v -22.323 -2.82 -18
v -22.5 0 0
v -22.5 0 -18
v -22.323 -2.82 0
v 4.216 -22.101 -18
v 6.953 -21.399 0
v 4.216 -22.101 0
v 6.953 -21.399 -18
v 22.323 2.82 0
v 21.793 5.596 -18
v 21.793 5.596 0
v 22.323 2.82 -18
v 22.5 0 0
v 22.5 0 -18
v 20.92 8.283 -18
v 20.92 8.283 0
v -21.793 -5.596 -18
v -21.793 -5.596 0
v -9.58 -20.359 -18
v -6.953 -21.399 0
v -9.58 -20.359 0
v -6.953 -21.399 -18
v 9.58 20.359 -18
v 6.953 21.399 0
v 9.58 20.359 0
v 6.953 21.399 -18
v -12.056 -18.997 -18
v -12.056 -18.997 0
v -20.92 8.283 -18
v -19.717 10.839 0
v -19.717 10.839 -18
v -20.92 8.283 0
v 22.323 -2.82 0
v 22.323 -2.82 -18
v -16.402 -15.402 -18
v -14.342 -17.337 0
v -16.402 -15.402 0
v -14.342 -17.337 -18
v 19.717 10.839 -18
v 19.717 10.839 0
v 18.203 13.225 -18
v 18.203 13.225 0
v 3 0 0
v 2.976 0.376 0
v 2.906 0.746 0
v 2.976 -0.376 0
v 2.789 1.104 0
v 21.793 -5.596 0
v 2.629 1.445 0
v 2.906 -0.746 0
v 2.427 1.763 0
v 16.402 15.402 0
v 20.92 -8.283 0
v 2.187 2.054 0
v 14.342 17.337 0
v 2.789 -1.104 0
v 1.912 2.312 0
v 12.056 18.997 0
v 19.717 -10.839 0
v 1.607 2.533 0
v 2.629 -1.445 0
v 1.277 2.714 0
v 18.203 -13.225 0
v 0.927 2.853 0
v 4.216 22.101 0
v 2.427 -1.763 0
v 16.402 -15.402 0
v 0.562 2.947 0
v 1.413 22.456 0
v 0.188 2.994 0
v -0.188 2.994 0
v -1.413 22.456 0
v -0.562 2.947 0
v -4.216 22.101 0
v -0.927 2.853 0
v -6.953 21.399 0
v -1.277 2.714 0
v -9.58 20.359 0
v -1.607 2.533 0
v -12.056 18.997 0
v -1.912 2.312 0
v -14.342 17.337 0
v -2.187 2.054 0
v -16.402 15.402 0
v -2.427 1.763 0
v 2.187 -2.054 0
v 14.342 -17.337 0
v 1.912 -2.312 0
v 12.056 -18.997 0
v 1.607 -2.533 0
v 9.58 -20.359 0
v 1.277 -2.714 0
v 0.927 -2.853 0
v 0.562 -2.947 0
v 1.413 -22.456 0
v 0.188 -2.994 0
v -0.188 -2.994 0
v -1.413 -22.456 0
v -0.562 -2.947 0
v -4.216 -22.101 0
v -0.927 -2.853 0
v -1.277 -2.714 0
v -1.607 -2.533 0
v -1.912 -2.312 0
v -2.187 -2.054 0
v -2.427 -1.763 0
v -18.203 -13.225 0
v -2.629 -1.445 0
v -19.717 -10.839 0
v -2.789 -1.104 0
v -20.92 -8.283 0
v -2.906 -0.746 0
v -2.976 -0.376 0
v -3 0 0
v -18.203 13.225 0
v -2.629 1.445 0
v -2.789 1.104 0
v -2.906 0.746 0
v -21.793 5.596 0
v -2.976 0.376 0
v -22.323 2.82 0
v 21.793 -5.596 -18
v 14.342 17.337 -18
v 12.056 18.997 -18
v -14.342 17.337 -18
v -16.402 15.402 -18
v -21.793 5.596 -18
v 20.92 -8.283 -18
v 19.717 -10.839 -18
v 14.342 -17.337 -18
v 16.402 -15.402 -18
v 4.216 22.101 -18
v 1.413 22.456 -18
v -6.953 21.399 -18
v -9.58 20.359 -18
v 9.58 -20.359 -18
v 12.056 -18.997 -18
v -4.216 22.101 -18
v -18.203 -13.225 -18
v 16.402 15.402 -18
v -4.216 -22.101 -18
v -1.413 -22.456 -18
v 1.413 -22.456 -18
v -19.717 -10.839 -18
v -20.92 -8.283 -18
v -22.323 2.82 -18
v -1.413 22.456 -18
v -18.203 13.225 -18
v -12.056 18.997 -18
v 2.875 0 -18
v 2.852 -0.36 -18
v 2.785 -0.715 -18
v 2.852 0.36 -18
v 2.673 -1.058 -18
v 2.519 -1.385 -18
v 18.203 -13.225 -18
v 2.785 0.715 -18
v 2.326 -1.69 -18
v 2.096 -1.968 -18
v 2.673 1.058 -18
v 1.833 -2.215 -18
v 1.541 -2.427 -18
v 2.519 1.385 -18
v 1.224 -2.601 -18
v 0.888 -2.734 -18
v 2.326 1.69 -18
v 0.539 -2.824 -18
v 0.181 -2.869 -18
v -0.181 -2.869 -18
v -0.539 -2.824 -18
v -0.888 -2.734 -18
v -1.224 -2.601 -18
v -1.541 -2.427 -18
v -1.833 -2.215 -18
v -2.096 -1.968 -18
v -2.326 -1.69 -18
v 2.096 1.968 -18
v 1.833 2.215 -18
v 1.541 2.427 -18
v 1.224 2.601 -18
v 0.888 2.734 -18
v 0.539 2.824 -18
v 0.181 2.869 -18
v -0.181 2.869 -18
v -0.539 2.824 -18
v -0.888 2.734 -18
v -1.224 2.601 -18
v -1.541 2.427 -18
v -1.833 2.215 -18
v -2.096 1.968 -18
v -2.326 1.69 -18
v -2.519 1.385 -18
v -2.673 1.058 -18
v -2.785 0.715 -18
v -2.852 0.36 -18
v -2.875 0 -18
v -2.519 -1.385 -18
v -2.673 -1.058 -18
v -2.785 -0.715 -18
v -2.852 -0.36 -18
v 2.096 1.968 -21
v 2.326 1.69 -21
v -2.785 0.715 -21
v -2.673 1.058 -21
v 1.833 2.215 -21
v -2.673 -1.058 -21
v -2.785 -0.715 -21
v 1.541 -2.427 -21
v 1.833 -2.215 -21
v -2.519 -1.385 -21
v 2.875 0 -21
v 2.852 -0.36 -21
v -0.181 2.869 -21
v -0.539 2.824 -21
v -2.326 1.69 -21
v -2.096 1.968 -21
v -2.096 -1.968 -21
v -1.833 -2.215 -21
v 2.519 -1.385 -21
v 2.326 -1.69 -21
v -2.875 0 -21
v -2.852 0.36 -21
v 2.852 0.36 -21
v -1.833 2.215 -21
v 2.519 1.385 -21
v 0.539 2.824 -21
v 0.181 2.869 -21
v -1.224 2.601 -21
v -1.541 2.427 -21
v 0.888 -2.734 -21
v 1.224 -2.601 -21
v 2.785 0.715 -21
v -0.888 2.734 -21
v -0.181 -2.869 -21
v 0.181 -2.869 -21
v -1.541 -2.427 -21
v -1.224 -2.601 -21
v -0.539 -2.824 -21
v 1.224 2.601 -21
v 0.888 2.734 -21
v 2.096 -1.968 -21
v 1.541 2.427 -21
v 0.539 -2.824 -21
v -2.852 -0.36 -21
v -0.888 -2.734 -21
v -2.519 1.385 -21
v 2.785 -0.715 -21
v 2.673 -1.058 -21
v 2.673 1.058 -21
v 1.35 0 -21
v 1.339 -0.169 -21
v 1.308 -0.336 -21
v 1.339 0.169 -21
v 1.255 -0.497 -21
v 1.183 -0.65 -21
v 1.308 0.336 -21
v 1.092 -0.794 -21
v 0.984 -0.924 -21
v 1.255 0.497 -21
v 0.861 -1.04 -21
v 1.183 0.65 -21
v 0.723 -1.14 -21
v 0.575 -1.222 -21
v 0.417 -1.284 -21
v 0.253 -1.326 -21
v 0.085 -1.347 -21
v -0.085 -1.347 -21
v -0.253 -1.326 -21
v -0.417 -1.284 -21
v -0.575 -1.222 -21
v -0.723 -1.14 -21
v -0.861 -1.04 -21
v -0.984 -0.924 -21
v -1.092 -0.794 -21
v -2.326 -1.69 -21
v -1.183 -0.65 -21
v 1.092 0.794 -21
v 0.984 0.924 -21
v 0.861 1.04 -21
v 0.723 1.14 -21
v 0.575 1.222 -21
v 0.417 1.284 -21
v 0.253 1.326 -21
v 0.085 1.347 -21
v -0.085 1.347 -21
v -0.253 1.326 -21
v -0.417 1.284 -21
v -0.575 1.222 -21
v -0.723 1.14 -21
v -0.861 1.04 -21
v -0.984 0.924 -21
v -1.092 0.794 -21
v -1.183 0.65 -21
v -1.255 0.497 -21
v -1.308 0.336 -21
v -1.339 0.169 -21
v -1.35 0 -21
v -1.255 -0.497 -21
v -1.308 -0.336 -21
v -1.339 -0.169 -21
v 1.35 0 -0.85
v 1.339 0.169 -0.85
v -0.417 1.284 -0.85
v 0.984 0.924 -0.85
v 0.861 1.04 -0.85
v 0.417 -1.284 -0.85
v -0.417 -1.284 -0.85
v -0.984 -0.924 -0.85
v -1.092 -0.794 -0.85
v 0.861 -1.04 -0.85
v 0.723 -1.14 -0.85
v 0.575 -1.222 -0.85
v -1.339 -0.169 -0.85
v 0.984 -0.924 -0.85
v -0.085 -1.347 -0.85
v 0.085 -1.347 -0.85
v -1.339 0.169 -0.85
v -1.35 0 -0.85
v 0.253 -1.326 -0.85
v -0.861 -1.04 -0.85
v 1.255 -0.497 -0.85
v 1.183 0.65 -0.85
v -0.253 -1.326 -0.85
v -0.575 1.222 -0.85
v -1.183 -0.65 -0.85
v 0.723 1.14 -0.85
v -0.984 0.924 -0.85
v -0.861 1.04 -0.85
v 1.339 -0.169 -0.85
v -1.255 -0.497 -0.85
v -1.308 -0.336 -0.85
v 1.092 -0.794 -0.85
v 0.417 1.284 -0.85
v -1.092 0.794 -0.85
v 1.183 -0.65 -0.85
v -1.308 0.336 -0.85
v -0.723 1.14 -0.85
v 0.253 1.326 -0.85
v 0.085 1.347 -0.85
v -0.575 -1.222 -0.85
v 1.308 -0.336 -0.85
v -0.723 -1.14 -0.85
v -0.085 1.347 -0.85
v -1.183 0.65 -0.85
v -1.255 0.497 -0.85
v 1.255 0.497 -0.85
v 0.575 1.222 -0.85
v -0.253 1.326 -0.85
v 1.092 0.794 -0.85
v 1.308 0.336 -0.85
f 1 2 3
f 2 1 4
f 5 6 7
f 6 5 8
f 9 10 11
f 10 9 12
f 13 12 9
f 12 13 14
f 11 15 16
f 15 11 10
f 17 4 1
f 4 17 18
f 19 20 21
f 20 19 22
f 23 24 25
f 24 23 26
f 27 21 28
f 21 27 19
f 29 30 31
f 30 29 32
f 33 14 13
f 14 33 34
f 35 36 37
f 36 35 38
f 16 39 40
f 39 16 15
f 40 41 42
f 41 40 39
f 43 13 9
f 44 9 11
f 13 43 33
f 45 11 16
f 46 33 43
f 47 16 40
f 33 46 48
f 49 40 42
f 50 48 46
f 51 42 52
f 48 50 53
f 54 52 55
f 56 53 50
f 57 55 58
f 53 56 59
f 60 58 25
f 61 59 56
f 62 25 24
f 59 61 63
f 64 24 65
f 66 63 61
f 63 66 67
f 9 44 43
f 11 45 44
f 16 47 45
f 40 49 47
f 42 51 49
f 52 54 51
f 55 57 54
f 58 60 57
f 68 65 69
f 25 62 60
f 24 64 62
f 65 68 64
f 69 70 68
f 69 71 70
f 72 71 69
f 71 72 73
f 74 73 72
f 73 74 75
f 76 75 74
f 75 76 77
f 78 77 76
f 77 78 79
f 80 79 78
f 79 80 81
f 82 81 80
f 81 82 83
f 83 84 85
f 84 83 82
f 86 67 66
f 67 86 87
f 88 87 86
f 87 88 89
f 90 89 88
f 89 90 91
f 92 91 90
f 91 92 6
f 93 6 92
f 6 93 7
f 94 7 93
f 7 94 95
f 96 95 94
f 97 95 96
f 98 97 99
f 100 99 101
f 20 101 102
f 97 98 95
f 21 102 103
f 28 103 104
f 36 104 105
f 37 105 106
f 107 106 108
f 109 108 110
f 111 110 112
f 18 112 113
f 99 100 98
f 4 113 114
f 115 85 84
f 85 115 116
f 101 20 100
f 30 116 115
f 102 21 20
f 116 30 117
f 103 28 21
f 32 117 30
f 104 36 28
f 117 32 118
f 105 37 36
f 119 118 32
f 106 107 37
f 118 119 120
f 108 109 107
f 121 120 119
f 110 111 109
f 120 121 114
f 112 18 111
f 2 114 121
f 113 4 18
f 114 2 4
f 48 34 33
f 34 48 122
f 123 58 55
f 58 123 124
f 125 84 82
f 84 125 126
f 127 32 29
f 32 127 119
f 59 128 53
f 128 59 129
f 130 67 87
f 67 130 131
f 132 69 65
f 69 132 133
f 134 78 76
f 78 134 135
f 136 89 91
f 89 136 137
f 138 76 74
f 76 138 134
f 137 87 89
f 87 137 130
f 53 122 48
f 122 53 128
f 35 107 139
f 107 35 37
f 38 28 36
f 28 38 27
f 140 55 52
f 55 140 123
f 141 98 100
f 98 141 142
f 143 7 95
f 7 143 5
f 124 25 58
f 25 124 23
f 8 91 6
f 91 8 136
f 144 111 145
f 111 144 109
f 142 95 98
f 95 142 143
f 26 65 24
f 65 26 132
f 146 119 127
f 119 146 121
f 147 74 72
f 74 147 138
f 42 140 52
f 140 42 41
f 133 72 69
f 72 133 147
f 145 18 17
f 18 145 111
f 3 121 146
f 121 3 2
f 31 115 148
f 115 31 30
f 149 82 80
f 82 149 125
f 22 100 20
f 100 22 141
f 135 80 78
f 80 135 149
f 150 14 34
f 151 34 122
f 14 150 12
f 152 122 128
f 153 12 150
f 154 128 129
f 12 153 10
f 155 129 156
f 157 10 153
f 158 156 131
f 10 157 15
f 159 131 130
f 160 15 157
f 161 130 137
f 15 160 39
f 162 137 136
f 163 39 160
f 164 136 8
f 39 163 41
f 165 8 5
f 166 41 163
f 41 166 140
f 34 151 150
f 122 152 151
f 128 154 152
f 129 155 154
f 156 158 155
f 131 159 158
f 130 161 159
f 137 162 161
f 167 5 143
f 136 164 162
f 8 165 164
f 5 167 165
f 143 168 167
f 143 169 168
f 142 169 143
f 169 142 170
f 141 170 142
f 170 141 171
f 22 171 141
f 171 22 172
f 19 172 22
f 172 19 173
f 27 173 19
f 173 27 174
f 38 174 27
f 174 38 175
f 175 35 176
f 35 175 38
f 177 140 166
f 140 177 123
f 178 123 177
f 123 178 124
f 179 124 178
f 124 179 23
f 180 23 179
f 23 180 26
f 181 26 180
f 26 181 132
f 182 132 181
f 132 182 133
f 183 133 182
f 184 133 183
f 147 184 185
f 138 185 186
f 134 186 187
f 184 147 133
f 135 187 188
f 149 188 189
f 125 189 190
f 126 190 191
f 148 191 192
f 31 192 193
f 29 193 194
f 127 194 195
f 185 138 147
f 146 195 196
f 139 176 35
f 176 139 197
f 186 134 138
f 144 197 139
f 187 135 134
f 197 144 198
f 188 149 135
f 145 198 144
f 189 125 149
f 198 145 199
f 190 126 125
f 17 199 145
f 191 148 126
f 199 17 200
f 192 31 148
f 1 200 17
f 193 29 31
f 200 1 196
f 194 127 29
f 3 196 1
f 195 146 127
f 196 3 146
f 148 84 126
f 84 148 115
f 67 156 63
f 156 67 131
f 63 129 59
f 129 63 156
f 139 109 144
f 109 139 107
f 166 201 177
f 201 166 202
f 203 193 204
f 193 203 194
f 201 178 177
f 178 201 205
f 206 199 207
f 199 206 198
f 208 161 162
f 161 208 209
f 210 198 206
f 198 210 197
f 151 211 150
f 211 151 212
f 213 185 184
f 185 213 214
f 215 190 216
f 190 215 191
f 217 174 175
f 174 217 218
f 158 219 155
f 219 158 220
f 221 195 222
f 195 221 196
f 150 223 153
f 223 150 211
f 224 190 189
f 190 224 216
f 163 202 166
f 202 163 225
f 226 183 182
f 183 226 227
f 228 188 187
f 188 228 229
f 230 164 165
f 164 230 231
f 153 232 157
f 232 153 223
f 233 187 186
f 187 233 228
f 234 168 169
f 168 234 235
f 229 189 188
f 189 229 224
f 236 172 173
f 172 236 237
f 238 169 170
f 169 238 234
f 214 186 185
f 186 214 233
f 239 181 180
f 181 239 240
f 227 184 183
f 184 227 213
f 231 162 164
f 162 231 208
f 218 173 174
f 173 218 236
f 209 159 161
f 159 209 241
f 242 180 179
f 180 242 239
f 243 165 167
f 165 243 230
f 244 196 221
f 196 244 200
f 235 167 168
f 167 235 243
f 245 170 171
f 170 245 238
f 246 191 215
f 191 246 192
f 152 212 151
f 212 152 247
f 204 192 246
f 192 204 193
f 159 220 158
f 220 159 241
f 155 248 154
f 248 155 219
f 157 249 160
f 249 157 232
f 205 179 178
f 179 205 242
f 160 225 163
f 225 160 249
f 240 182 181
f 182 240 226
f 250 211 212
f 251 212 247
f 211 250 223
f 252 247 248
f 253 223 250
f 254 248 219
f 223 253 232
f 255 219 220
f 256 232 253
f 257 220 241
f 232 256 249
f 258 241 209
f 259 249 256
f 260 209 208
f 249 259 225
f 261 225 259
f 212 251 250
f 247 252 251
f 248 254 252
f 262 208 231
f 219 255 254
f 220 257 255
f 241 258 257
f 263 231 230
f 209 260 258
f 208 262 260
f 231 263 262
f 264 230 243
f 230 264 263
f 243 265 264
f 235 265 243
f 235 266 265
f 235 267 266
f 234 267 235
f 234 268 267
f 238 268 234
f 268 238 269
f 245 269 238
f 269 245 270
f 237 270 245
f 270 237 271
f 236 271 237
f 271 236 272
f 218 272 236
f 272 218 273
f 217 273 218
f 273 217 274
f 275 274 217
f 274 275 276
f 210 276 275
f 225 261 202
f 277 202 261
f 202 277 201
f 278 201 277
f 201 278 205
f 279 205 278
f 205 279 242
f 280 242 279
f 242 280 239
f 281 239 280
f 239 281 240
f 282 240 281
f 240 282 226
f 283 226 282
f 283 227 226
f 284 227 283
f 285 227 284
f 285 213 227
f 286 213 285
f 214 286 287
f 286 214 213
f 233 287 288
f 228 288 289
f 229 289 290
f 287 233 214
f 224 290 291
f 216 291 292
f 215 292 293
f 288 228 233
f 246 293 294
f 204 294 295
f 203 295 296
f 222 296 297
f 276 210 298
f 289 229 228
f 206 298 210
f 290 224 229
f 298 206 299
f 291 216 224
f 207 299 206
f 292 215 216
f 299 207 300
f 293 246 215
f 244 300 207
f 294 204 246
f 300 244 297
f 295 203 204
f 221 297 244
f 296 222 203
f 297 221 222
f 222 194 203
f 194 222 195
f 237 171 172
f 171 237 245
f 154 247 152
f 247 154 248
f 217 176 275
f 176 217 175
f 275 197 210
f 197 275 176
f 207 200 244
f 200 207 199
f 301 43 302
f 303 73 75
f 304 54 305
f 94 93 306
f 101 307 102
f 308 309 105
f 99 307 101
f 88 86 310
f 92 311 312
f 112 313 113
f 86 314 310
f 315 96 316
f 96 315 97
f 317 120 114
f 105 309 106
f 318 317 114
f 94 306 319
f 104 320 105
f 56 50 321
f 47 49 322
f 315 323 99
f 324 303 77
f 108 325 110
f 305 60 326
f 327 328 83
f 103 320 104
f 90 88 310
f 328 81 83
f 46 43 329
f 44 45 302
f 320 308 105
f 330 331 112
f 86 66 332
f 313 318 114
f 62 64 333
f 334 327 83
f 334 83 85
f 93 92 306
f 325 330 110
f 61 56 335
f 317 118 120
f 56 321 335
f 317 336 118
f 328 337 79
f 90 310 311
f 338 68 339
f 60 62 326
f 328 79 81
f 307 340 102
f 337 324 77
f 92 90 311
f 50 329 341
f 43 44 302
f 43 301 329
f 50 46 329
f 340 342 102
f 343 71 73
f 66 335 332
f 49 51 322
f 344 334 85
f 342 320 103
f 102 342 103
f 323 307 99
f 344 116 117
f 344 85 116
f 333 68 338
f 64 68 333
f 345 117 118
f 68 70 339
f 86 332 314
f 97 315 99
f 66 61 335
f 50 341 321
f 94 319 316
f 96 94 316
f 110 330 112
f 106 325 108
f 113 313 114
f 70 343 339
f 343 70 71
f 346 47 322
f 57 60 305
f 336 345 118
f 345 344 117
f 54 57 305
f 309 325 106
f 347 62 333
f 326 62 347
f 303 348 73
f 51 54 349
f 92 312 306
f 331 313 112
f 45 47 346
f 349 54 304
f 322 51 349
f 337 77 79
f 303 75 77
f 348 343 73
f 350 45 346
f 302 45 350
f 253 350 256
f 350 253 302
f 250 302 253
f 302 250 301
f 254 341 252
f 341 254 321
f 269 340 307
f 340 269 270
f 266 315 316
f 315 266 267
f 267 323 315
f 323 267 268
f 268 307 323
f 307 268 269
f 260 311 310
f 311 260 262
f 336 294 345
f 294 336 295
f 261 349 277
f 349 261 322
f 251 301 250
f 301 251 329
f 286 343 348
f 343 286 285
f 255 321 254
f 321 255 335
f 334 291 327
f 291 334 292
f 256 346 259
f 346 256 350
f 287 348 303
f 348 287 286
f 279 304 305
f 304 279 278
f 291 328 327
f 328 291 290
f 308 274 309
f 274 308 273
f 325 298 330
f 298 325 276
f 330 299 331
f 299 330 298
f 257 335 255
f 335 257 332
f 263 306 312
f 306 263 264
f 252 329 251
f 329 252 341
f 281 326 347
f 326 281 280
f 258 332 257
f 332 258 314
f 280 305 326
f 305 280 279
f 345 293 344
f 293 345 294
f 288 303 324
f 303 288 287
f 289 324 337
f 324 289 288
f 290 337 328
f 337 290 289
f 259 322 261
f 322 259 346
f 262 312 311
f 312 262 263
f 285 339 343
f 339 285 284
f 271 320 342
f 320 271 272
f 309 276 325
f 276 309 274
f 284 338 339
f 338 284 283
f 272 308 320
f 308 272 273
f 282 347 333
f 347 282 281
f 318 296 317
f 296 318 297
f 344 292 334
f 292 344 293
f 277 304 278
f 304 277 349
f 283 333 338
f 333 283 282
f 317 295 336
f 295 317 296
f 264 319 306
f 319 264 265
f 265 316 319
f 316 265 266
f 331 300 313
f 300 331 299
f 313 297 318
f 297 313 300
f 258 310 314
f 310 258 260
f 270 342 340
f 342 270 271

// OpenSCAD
$fn = 50;

difference() {
	union() {
		translate(v = [0, 0, -18.0]) {
			cylinder(h = 18, r = 22.5);
		}
		#translate(v = [0, 0, -21.0]) {
			cylinder(h = 21, r = 2.875);
		}
	}
	union() {
		translate(v = [0, 0, 0]) {
			rotate(a = [0, 0, 0]) {
				difference() {
					union() {
						translate(v = [0, 0, -21.0]) {
							cylinder(h = 21, r = 1.0);
						}
						translate(v = [0, 0, -0.85]) {
							cylinder(h = 0.85, r1 = 1.35, r2 = 3.0);
						}
						translate(v = [0, 0, -21.0]) {
							cylinder(h = 21, r = 1.35);
						}
						translate(v = [0, 0, -21.0]) {
							cylinder(h = 21, r = 1.0);
						}
					}
					union();
				}
			}
		}
	}
}
